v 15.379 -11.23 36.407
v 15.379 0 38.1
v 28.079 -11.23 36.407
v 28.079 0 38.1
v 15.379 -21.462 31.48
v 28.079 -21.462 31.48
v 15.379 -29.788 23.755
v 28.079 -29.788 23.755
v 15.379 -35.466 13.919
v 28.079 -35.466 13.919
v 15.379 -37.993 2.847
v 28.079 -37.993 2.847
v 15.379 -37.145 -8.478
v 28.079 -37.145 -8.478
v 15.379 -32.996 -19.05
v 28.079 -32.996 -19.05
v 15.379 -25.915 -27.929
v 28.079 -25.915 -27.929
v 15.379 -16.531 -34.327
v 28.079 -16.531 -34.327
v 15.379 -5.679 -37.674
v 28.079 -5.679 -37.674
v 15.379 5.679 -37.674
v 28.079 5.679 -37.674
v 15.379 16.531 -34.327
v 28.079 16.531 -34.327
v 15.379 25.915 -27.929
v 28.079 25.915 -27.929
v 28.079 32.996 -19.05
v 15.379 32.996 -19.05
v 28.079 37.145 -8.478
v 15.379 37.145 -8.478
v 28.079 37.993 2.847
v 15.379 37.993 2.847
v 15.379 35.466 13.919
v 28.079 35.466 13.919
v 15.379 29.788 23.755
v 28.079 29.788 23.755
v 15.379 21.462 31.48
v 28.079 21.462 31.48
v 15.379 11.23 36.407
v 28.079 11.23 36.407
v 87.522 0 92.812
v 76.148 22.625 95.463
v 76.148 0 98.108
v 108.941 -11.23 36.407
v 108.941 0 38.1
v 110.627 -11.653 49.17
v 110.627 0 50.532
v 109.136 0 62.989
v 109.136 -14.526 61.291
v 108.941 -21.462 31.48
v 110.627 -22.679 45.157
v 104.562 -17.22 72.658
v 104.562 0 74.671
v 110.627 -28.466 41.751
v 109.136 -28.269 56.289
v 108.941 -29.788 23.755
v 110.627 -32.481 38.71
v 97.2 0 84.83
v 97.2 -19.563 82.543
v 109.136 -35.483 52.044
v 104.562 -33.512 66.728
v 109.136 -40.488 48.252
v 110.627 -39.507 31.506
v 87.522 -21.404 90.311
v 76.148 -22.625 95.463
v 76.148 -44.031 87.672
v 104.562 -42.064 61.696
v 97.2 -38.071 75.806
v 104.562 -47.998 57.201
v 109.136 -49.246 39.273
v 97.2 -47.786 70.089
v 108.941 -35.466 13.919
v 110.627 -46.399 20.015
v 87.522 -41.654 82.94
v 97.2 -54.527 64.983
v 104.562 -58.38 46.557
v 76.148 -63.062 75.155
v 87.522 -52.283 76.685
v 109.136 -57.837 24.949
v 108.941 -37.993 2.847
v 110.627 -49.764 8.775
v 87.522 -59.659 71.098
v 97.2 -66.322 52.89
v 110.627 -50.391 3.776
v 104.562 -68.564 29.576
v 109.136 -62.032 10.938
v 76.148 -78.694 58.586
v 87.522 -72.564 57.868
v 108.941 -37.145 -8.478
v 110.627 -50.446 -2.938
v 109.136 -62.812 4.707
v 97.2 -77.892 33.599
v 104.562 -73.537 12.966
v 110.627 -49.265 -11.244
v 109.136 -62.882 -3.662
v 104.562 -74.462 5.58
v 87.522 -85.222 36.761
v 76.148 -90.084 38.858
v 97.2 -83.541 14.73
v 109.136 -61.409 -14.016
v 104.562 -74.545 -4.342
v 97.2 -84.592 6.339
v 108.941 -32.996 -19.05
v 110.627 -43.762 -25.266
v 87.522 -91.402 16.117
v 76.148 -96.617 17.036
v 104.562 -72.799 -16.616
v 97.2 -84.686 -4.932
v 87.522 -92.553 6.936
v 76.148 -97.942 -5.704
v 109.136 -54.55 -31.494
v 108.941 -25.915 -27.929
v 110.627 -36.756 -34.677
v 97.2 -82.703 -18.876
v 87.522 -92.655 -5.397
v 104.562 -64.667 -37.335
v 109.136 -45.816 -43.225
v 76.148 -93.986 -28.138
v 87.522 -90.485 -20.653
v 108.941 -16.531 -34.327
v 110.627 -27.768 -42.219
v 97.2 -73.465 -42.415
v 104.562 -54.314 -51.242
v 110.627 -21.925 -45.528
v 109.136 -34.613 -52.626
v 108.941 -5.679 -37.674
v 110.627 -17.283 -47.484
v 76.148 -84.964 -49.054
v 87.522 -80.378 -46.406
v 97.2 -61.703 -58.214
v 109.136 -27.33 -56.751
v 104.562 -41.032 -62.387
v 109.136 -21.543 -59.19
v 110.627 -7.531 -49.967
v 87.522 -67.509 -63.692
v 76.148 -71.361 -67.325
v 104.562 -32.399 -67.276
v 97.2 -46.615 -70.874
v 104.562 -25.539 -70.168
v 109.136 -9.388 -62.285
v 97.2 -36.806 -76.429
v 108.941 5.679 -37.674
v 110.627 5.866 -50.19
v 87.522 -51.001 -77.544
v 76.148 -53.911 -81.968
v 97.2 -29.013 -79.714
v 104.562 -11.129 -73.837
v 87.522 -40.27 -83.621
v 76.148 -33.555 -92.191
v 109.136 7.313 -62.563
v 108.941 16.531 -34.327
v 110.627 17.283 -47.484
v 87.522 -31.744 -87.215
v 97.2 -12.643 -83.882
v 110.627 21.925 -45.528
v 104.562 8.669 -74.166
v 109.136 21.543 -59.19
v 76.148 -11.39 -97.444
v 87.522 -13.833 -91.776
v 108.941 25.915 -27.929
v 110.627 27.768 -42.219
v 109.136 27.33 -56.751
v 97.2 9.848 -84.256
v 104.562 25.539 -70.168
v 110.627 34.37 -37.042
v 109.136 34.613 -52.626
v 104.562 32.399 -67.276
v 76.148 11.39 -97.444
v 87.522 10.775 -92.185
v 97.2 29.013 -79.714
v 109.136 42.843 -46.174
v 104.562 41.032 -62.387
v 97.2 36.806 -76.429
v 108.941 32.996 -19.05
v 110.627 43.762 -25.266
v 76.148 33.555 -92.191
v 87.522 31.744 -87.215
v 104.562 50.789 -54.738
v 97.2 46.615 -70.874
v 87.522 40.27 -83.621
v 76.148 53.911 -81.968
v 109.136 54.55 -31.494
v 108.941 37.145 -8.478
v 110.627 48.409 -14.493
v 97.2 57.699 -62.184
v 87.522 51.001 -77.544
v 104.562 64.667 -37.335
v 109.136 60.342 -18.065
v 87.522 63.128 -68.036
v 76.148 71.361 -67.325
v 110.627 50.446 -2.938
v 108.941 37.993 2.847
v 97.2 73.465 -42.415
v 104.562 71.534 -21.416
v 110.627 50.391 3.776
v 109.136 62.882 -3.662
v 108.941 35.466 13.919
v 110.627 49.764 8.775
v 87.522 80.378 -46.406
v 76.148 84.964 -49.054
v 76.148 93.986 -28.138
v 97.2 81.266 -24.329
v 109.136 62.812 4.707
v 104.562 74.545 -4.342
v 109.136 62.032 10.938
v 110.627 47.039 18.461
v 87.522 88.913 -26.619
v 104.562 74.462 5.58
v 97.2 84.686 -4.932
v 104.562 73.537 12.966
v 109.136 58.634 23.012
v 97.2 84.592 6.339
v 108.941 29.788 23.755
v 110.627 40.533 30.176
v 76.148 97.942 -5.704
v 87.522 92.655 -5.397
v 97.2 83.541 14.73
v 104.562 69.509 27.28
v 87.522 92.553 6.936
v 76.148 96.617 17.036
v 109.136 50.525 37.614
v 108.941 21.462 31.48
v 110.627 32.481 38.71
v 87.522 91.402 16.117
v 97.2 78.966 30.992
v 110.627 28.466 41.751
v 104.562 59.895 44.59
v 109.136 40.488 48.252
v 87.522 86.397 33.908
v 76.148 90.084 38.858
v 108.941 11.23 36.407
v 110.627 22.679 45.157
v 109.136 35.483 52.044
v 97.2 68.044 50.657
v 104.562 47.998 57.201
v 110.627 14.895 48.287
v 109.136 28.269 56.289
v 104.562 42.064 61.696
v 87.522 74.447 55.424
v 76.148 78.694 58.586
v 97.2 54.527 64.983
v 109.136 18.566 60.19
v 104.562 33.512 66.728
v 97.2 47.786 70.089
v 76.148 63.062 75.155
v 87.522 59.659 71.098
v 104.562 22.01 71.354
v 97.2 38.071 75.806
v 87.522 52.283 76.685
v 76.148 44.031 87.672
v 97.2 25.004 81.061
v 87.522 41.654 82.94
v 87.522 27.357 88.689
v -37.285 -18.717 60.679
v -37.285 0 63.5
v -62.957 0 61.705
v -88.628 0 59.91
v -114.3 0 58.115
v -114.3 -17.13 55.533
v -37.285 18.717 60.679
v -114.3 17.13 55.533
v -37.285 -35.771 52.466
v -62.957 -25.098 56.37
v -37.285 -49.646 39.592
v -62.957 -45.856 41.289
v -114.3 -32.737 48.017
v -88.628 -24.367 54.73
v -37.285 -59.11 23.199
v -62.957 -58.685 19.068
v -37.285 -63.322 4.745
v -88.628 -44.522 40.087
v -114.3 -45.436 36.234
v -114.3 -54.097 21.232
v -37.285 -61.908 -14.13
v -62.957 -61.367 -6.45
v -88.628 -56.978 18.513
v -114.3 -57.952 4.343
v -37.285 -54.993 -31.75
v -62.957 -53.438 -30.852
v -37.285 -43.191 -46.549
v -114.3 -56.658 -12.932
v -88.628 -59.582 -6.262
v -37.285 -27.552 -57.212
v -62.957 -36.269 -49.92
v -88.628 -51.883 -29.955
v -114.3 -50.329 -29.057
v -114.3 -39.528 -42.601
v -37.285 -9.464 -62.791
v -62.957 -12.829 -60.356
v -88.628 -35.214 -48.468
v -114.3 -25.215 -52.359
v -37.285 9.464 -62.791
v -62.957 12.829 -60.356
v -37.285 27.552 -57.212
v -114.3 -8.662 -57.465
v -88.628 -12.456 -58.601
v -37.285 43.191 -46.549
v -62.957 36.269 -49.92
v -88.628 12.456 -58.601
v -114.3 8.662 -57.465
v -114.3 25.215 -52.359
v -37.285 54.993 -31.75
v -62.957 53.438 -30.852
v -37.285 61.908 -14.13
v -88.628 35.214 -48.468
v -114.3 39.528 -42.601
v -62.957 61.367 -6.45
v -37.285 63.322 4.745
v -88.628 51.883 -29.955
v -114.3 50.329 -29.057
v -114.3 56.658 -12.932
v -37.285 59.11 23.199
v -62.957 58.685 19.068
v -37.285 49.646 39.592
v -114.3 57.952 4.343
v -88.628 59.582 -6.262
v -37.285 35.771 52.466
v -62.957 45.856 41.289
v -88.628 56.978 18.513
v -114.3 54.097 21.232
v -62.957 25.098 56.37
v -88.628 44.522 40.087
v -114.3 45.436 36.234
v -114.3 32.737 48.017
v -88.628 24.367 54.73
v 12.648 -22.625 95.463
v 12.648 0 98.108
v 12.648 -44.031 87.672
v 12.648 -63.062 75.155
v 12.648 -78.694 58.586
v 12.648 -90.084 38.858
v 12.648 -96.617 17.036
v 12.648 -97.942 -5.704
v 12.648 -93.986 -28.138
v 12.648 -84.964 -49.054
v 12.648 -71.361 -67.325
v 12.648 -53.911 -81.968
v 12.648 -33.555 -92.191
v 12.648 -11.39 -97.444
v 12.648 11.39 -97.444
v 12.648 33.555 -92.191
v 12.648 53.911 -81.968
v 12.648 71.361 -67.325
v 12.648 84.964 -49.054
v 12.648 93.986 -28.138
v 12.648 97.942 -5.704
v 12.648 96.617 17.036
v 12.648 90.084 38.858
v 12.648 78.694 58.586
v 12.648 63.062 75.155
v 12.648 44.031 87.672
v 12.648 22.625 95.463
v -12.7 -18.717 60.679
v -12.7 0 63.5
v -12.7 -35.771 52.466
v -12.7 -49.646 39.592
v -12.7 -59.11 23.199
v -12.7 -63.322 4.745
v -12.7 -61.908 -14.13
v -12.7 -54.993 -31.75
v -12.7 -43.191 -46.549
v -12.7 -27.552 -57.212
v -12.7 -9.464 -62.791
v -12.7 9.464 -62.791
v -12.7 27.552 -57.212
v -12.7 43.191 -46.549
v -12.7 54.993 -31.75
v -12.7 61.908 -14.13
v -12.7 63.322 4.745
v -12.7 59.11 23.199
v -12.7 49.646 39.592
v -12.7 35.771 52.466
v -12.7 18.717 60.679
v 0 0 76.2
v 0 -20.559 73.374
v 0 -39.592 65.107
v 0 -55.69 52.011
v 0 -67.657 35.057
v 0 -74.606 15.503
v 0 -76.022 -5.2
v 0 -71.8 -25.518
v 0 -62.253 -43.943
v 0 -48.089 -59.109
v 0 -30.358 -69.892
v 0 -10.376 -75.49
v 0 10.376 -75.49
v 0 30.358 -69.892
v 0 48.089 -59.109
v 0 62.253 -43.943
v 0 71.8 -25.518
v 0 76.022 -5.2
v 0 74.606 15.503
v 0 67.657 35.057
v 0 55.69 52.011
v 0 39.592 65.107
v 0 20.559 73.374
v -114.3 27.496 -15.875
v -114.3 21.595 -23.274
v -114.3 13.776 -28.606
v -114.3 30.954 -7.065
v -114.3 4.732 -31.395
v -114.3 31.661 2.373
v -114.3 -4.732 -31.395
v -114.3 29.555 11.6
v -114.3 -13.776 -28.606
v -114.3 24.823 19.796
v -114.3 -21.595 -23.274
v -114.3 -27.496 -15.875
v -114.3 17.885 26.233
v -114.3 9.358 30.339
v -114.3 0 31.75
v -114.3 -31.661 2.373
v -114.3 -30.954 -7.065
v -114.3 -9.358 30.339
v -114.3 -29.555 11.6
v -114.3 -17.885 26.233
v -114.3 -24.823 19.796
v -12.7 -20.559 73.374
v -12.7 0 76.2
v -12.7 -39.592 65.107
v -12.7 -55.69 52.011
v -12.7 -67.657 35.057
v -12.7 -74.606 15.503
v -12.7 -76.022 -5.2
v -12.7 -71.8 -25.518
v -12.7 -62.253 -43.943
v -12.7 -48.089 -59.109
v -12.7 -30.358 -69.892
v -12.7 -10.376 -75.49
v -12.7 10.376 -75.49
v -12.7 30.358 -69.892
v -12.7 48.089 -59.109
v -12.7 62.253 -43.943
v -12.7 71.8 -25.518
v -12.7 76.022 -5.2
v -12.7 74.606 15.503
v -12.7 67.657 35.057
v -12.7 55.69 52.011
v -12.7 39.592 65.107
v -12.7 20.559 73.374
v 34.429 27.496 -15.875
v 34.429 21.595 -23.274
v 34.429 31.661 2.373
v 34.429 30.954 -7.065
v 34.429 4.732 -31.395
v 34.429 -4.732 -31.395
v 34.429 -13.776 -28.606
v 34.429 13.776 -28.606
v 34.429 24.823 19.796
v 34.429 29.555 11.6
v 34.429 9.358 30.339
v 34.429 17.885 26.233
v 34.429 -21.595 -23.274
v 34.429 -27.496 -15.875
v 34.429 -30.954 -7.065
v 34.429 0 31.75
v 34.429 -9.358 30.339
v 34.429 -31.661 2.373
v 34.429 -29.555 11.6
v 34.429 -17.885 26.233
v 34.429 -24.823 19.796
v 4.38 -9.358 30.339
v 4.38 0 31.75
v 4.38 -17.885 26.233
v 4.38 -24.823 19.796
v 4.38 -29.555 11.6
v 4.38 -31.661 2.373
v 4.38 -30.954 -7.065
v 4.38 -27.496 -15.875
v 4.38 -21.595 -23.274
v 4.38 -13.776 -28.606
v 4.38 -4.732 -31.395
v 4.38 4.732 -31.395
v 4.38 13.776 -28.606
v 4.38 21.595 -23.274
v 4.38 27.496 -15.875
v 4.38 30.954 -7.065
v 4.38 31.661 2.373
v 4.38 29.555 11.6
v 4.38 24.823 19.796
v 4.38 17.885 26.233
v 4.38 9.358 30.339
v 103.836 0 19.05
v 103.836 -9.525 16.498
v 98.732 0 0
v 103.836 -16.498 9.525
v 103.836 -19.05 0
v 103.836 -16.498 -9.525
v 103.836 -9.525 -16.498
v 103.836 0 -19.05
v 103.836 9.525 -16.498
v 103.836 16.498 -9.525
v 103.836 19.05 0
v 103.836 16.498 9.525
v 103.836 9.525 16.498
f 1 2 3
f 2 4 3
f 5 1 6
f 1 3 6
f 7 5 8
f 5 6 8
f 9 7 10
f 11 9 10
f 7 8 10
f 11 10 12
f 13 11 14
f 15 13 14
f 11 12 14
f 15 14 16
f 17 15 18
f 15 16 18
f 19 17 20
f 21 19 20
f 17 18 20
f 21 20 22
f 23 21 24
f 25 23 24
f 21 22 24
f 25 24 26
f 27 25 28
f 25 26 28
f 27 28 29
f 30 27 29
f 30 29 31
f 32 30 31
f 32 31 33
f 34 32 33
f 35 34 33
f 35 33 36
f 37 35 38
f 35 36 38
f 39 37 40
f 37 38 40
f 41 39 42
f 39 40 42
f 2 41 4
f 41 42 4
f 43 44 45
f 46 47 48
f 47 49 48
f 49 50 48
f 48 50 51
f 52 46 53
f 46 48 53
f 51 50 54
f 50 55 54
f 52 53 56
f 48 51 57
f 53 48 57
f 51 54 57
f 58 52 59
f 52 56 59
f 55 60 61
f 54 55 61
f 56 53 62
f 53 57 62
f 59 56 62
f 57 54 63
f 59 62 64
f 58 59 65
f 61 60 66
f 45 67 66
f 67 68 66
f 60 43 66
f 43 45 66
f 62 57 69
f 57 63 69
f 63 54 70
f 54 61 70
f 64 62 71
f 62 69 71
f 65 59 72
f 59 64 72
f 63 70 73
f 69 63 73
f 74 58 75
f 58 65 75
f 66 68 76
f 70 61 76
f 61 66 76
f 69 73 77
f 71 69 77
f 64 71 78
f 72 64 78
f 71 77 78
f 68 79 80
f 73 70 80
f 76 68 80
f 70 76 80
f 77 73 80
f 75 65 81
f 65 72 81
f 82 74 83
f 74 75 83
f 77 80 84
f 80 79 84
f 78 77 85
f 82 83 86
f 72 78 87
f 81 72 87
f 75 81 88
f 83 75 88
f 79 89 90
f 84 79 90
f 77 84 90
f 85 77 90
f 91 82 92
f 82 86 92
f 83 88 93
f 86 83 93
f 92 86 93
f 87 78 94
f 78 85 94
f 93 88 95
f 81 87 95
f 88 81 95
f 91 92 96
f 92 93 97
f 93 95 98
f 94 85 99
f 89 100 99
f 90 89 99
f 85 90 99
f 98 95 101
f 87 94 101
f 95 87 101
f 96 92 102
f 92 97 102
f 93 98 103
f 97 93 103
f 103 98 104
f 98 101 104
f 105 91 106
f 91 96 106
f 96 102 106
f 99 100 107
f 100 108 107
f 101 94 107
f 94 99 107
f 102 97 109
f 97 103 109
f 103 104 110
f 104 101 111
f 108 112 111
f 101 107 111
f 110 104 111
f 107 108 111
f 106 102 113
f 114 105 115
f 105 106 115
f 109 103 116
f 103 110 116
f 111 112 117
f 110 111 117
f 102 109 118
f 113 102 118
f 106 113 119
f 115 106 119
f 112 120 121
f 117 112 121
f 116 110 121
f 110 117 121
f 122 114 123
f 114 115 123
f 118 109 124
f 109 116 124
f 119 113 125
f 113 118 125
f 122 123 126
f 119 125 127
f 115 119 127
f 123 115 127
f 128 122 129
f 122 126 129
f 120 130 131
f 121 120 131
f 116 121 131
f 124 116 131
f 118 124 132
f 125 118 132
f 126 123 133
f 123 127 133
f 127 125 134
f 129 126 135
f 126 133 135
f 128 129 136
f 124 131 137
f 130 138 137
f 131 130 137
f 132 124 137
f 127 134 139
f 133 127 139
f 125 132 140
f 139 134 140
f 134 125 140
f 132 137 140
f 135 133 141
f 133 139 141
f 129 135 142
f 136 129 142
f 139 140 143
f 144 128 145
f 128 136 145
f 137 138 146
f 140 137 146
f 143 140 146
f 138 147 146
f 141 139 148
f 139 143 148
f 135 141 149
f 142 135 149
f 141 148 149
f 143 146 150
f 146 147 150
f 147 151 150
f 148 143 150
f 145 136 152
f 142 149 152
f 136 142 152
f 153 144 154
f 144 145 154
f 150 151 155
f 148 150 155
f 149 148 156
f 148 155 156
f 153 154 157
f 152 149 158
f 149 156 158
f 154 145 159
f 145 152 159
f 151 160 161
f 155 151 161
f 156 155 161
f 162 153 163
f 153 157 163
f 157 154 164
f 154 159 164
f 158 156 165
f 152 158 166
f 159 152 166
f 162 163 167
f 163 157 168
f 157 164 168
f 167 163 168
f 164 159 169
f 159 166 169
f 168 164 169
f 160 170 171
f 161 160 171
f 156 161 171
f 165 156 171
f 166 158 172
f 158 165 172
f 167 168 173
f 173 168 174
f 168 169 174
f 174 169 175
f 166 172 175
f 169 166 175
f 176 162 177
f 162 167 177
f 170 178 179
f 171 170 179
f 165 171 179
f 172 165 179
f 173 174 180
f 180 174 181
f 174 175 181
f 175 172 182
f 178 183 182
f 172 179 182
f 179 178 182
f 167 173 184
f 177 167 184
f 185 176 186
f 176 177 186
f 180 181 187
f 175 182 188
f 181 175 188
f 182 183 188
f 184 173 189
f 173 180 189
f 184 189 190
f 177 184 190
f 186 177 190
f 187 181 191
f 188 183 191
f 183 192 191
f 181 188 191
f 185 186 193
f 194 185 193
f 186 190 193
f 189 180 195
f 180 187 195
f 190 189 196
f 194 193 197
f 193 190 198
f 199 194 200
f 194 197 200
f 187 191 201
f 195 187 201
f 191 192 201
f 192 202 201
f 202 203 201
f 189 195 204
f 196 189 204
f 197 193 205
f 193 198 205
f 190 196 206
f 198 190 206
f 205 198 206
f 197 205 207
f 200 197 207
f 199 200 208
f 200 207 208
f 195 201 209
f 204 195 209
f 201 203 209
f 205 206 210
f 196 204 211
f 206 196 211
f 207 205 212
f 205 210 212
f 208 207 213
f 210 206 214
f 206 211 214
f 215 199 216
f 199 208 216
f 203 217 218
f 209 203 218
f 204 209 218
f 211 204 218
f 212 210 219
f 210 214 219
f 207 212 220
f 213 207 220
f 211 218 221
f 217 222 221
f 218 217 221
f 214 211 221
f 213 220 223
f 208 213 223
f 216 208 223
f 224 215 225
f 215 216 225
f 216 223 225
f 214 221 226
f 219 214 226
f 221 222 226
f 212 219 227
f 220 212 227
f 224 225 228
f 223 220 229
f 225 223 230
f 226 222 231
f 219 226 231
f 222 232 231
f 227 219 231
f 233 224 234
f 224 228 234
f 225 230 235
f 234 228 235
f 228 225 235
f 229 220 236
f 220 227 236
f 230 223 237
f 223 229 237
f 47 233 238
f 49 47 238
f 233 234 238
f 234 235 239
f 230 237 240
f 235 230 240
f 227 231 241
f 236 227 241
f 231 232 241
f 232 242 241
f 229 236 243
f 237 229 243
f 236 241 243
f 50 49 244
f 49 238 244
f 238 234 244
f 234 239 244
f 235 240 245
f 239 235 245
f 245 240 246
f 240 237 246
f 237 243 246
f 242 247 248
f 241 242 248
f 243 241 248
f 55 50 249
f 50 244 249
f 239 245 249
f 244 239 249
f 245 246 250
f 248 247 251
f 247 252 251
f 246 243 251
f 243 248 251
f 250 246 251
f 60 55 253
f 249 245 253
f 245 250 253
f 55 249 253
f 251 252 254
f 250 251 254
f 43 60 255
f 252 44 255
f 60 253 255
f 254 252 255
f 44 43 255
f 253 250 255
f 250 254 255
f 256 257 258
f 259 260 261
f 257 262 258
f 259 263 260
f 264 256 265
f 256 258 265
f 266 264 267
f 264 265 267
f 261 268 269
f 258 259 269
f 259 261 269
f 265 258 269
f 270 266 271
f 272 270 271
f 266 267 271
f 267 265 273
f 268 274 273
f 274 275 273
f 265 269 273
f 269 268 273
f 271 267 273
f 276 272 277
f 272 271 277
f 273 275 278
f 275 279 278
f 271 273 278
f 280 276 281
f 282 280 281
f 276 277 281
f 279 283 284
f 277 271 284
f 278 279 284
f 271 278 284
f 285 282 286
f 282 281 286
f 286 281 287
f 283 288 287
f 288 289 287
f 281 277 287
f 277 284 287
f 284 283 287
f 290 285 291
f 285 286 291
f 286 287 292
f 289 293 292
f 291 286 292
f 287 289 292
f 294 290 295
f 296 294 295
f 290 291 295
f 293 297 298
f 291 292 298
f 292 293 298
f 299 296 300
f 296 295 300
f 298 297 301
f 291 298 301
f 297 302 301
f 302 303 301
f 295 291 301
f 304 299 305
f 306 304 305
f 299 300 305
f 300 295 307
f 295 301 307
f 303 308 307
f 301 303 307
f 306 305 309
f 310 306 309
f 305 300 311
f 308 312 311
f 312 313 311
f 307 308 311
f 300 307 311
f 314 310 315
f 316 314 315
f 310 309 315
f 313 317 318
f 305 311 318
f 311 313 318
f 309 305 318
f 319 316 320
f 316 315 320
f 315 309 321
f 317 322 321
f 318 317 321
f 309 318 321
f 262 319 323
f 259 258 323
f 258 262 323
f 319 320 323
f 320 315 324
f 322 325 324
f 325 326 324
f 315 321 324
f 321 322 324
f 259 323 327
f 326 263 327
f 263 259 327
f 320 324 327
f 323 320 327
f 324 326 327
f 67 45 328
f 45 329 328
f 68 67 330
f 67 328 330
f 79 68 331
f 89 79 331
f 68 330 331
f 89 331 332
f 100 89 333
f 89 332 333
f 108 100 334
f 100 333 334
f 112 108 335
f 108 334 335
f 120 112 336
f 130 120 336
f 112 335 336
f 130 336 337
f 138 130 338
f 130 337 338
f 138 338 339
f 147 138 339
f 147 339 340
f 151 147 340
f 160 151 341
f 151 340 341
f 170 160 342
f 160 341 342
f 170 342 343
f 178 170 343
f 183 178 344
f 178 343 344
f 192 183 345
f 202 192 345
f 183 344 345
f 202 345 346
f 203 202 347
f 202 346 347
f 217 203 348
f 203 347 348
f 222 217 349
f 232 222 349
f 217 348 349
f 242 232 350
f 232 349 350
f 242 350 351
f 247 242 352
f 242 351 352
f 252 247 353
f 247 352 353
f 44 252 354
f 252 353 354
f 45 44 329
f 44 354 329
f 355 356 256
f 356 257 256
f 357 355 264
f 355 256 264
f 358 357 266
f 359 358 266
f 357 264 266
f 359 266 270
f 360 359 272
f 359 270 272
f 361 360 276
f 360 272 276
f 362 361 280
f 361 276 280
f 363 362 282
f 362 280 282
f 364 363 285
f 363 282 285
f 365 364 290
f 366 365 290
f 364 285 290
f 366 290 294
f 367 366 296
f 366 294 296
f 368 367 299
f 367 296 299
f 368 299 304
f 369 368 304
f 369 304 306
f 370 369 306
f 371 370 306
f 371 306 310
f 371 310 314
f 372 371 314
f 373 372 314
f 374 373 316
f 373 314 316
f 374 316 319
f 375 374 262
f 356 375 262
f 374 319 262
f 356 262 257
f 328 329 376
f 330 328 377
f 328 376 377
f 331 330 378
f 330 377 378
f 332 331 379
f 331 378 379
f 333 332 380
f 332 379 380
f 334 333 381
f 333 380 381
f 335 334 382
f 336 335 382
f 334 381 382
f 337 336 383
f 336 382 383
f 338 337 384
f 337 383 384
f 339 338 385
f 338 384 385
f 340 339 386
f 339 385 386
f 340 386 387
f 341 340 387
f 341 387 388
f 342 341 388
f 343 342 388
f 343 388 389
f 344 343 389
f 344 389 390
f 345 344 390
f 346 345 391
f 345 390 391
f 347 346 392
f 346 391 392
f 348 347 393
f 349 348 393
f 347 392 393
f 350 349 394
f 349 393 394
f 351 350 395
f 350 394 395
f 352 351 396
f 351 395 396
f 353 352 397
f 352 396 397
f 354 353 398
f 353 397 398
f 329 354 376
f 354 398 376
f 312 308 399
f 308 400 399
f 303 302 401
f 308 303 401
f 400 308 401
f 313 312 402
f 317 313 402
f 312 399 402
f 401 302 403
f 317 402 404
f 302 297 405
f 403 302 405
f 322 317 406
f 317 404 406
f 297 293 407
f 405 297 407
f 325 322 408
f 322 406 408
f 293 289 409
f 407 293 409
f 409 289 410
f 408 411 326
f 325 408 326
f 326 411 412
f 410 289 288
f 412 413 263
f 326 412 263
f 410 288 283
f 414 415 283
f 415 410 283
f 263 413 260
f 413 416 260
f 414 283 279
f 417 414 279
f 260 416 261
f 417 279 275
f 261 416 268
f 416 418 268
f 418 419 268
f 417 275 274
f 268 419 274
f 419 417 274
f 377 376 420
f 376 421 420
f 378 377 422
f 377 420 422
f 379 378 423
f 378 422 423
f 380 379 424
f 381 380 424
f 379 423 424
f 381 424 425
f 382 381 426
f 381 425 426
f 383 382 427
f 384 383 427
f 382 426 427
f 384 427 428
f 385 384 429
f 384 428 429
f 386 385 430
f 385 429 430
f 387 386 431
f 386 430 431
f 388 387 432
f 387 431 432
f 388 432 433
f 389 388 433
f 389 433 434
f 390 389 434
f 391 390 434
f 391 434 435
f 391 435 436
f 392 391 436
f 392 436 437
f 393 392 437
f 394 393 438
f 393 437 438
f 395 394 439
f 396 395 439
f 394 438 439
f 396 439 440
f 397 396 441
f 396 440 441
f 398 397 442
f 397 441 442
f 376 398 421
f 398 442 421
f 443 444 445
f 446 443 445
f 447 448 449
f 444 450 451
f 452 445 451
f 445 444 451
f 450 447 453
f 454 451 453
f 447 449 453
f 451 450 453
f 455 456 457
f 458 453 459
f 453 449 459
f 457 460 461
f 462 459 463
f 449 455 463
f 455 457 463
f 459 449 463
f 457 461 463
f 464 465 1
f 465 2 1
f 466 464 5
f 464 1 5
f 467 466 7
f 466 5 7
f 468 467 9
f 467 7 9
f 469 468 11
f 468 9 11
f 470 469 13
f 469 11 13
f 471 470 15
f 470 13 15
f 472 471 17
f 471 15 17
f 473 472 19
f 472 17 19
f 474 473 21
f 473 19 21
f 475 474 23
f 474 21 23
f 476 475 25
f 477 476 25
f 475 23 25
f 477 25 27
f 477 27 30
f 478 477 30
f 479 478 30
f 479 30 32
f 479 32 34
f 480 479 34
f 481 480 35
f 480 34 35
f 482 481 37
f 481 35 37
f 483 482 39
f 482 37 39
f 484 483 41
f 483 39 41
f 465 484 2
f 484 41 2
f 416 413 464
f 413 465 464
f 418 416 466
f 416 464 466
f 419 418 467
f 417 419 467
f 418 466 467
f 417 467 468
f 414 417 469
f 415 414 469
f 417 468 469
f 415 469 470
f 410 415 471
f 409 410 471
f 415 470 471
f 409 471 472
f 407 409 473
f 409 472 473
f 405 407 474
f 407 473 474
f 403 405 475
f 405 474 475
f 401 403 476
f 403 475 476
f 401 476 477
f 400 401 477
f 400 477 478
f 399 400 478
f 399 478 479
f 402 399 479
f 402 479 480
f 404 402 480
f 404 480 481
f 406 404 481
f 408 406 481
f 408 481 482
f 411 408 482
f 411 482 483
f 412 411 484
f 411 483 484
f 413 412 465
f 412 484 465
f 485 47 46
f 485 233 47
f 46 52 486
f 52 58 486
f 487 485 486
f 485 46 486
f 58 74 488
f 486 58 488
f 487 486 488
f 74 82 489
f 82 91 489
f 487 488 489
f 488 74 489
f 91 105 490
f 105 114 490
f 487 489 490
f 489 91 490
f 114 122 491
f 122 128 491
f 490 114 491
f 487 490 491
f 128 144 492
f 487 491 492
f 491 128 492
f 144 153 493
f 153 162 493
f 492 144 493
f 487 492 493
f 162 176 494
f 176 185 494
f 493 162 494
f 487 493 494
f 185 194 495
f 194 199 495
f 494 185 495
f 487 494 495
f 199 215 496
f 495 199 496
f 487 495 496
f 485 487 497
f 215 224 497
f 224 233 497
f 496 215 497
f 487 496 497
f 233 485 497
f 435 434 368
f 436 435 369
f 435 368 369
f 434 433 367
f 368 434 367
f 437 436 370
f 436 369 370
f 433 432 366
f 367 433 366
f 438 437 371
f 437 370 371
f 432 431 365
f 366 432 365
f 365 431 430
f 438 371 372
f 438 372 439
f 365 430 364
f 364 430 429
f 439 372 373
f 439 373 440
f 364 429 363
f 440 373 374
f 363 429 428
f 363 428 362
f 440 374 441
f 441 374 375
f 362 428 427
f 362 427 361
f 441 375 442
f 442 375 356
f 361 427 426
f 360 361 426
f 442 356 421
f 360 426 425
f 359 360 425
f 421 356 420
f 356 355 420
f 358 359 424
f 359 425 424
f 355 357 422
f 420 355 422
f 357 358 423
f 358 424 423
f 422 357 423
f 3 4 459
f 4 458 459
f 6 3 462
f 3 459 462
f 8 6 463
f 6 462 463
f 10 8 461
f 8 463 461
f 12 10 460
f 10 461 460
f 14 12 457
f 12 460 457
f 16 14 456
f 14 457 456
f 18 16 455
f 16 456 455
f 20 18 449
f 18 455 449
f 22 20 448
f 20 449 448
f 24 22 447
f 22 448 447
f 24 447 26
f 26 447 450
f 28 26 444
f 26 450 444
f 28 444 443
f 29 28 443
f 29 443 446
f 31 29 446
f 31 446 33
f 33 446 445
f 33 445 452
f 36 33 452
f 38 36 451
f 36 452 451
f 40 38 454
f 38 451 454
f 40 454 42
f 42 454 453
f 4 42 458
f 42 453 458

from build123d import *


with BuildPart() as f1:
    # F0 (on Front) → F1 (revolve)
    with BuildSketch(Plane.XZ):
        with BuildLine():
            Line((-114.3, 58.114587), (-114.3, 31.75))
            Line((-114.3, 31.75), (4.380015, 31.75))
            Line((4.380015, 31.75), (15.378538, 38.1))
            Line((15.378538, 38.1), (28.078538, 38.1))
            Line((28.078538, 38.1), (34.428538, 31.75))
            Line((34.428538, 31.75), (34.428538, 0))
            Line((34.428538, 0), (98.73198, 0))
            Line((98.73198, 0), (108.940844, 38.1))
            ThreePointArc((108.940844, 38.1), (104.562064, 74.670998), (76.148301, 98.1075))
            Line((76.148301, 98.1075), (12.648301, 98.1075))
            Line((12.648301, 98.1075), (0, 76.2))
            Line((0, 76.2), (-12.7, 76.2))
            Line((-12.7, 76.2), (-12.7, 63.5))
            Line((-12.7, 63.5), (-37.28501, 63.5))
            Line((-37.28501, 63.5), (-114.3, 58.114587))
        make_face()
    revolve(axis=Axis((50.931664, 0, 0), (1, 0, 0)))


solid = f1.part
